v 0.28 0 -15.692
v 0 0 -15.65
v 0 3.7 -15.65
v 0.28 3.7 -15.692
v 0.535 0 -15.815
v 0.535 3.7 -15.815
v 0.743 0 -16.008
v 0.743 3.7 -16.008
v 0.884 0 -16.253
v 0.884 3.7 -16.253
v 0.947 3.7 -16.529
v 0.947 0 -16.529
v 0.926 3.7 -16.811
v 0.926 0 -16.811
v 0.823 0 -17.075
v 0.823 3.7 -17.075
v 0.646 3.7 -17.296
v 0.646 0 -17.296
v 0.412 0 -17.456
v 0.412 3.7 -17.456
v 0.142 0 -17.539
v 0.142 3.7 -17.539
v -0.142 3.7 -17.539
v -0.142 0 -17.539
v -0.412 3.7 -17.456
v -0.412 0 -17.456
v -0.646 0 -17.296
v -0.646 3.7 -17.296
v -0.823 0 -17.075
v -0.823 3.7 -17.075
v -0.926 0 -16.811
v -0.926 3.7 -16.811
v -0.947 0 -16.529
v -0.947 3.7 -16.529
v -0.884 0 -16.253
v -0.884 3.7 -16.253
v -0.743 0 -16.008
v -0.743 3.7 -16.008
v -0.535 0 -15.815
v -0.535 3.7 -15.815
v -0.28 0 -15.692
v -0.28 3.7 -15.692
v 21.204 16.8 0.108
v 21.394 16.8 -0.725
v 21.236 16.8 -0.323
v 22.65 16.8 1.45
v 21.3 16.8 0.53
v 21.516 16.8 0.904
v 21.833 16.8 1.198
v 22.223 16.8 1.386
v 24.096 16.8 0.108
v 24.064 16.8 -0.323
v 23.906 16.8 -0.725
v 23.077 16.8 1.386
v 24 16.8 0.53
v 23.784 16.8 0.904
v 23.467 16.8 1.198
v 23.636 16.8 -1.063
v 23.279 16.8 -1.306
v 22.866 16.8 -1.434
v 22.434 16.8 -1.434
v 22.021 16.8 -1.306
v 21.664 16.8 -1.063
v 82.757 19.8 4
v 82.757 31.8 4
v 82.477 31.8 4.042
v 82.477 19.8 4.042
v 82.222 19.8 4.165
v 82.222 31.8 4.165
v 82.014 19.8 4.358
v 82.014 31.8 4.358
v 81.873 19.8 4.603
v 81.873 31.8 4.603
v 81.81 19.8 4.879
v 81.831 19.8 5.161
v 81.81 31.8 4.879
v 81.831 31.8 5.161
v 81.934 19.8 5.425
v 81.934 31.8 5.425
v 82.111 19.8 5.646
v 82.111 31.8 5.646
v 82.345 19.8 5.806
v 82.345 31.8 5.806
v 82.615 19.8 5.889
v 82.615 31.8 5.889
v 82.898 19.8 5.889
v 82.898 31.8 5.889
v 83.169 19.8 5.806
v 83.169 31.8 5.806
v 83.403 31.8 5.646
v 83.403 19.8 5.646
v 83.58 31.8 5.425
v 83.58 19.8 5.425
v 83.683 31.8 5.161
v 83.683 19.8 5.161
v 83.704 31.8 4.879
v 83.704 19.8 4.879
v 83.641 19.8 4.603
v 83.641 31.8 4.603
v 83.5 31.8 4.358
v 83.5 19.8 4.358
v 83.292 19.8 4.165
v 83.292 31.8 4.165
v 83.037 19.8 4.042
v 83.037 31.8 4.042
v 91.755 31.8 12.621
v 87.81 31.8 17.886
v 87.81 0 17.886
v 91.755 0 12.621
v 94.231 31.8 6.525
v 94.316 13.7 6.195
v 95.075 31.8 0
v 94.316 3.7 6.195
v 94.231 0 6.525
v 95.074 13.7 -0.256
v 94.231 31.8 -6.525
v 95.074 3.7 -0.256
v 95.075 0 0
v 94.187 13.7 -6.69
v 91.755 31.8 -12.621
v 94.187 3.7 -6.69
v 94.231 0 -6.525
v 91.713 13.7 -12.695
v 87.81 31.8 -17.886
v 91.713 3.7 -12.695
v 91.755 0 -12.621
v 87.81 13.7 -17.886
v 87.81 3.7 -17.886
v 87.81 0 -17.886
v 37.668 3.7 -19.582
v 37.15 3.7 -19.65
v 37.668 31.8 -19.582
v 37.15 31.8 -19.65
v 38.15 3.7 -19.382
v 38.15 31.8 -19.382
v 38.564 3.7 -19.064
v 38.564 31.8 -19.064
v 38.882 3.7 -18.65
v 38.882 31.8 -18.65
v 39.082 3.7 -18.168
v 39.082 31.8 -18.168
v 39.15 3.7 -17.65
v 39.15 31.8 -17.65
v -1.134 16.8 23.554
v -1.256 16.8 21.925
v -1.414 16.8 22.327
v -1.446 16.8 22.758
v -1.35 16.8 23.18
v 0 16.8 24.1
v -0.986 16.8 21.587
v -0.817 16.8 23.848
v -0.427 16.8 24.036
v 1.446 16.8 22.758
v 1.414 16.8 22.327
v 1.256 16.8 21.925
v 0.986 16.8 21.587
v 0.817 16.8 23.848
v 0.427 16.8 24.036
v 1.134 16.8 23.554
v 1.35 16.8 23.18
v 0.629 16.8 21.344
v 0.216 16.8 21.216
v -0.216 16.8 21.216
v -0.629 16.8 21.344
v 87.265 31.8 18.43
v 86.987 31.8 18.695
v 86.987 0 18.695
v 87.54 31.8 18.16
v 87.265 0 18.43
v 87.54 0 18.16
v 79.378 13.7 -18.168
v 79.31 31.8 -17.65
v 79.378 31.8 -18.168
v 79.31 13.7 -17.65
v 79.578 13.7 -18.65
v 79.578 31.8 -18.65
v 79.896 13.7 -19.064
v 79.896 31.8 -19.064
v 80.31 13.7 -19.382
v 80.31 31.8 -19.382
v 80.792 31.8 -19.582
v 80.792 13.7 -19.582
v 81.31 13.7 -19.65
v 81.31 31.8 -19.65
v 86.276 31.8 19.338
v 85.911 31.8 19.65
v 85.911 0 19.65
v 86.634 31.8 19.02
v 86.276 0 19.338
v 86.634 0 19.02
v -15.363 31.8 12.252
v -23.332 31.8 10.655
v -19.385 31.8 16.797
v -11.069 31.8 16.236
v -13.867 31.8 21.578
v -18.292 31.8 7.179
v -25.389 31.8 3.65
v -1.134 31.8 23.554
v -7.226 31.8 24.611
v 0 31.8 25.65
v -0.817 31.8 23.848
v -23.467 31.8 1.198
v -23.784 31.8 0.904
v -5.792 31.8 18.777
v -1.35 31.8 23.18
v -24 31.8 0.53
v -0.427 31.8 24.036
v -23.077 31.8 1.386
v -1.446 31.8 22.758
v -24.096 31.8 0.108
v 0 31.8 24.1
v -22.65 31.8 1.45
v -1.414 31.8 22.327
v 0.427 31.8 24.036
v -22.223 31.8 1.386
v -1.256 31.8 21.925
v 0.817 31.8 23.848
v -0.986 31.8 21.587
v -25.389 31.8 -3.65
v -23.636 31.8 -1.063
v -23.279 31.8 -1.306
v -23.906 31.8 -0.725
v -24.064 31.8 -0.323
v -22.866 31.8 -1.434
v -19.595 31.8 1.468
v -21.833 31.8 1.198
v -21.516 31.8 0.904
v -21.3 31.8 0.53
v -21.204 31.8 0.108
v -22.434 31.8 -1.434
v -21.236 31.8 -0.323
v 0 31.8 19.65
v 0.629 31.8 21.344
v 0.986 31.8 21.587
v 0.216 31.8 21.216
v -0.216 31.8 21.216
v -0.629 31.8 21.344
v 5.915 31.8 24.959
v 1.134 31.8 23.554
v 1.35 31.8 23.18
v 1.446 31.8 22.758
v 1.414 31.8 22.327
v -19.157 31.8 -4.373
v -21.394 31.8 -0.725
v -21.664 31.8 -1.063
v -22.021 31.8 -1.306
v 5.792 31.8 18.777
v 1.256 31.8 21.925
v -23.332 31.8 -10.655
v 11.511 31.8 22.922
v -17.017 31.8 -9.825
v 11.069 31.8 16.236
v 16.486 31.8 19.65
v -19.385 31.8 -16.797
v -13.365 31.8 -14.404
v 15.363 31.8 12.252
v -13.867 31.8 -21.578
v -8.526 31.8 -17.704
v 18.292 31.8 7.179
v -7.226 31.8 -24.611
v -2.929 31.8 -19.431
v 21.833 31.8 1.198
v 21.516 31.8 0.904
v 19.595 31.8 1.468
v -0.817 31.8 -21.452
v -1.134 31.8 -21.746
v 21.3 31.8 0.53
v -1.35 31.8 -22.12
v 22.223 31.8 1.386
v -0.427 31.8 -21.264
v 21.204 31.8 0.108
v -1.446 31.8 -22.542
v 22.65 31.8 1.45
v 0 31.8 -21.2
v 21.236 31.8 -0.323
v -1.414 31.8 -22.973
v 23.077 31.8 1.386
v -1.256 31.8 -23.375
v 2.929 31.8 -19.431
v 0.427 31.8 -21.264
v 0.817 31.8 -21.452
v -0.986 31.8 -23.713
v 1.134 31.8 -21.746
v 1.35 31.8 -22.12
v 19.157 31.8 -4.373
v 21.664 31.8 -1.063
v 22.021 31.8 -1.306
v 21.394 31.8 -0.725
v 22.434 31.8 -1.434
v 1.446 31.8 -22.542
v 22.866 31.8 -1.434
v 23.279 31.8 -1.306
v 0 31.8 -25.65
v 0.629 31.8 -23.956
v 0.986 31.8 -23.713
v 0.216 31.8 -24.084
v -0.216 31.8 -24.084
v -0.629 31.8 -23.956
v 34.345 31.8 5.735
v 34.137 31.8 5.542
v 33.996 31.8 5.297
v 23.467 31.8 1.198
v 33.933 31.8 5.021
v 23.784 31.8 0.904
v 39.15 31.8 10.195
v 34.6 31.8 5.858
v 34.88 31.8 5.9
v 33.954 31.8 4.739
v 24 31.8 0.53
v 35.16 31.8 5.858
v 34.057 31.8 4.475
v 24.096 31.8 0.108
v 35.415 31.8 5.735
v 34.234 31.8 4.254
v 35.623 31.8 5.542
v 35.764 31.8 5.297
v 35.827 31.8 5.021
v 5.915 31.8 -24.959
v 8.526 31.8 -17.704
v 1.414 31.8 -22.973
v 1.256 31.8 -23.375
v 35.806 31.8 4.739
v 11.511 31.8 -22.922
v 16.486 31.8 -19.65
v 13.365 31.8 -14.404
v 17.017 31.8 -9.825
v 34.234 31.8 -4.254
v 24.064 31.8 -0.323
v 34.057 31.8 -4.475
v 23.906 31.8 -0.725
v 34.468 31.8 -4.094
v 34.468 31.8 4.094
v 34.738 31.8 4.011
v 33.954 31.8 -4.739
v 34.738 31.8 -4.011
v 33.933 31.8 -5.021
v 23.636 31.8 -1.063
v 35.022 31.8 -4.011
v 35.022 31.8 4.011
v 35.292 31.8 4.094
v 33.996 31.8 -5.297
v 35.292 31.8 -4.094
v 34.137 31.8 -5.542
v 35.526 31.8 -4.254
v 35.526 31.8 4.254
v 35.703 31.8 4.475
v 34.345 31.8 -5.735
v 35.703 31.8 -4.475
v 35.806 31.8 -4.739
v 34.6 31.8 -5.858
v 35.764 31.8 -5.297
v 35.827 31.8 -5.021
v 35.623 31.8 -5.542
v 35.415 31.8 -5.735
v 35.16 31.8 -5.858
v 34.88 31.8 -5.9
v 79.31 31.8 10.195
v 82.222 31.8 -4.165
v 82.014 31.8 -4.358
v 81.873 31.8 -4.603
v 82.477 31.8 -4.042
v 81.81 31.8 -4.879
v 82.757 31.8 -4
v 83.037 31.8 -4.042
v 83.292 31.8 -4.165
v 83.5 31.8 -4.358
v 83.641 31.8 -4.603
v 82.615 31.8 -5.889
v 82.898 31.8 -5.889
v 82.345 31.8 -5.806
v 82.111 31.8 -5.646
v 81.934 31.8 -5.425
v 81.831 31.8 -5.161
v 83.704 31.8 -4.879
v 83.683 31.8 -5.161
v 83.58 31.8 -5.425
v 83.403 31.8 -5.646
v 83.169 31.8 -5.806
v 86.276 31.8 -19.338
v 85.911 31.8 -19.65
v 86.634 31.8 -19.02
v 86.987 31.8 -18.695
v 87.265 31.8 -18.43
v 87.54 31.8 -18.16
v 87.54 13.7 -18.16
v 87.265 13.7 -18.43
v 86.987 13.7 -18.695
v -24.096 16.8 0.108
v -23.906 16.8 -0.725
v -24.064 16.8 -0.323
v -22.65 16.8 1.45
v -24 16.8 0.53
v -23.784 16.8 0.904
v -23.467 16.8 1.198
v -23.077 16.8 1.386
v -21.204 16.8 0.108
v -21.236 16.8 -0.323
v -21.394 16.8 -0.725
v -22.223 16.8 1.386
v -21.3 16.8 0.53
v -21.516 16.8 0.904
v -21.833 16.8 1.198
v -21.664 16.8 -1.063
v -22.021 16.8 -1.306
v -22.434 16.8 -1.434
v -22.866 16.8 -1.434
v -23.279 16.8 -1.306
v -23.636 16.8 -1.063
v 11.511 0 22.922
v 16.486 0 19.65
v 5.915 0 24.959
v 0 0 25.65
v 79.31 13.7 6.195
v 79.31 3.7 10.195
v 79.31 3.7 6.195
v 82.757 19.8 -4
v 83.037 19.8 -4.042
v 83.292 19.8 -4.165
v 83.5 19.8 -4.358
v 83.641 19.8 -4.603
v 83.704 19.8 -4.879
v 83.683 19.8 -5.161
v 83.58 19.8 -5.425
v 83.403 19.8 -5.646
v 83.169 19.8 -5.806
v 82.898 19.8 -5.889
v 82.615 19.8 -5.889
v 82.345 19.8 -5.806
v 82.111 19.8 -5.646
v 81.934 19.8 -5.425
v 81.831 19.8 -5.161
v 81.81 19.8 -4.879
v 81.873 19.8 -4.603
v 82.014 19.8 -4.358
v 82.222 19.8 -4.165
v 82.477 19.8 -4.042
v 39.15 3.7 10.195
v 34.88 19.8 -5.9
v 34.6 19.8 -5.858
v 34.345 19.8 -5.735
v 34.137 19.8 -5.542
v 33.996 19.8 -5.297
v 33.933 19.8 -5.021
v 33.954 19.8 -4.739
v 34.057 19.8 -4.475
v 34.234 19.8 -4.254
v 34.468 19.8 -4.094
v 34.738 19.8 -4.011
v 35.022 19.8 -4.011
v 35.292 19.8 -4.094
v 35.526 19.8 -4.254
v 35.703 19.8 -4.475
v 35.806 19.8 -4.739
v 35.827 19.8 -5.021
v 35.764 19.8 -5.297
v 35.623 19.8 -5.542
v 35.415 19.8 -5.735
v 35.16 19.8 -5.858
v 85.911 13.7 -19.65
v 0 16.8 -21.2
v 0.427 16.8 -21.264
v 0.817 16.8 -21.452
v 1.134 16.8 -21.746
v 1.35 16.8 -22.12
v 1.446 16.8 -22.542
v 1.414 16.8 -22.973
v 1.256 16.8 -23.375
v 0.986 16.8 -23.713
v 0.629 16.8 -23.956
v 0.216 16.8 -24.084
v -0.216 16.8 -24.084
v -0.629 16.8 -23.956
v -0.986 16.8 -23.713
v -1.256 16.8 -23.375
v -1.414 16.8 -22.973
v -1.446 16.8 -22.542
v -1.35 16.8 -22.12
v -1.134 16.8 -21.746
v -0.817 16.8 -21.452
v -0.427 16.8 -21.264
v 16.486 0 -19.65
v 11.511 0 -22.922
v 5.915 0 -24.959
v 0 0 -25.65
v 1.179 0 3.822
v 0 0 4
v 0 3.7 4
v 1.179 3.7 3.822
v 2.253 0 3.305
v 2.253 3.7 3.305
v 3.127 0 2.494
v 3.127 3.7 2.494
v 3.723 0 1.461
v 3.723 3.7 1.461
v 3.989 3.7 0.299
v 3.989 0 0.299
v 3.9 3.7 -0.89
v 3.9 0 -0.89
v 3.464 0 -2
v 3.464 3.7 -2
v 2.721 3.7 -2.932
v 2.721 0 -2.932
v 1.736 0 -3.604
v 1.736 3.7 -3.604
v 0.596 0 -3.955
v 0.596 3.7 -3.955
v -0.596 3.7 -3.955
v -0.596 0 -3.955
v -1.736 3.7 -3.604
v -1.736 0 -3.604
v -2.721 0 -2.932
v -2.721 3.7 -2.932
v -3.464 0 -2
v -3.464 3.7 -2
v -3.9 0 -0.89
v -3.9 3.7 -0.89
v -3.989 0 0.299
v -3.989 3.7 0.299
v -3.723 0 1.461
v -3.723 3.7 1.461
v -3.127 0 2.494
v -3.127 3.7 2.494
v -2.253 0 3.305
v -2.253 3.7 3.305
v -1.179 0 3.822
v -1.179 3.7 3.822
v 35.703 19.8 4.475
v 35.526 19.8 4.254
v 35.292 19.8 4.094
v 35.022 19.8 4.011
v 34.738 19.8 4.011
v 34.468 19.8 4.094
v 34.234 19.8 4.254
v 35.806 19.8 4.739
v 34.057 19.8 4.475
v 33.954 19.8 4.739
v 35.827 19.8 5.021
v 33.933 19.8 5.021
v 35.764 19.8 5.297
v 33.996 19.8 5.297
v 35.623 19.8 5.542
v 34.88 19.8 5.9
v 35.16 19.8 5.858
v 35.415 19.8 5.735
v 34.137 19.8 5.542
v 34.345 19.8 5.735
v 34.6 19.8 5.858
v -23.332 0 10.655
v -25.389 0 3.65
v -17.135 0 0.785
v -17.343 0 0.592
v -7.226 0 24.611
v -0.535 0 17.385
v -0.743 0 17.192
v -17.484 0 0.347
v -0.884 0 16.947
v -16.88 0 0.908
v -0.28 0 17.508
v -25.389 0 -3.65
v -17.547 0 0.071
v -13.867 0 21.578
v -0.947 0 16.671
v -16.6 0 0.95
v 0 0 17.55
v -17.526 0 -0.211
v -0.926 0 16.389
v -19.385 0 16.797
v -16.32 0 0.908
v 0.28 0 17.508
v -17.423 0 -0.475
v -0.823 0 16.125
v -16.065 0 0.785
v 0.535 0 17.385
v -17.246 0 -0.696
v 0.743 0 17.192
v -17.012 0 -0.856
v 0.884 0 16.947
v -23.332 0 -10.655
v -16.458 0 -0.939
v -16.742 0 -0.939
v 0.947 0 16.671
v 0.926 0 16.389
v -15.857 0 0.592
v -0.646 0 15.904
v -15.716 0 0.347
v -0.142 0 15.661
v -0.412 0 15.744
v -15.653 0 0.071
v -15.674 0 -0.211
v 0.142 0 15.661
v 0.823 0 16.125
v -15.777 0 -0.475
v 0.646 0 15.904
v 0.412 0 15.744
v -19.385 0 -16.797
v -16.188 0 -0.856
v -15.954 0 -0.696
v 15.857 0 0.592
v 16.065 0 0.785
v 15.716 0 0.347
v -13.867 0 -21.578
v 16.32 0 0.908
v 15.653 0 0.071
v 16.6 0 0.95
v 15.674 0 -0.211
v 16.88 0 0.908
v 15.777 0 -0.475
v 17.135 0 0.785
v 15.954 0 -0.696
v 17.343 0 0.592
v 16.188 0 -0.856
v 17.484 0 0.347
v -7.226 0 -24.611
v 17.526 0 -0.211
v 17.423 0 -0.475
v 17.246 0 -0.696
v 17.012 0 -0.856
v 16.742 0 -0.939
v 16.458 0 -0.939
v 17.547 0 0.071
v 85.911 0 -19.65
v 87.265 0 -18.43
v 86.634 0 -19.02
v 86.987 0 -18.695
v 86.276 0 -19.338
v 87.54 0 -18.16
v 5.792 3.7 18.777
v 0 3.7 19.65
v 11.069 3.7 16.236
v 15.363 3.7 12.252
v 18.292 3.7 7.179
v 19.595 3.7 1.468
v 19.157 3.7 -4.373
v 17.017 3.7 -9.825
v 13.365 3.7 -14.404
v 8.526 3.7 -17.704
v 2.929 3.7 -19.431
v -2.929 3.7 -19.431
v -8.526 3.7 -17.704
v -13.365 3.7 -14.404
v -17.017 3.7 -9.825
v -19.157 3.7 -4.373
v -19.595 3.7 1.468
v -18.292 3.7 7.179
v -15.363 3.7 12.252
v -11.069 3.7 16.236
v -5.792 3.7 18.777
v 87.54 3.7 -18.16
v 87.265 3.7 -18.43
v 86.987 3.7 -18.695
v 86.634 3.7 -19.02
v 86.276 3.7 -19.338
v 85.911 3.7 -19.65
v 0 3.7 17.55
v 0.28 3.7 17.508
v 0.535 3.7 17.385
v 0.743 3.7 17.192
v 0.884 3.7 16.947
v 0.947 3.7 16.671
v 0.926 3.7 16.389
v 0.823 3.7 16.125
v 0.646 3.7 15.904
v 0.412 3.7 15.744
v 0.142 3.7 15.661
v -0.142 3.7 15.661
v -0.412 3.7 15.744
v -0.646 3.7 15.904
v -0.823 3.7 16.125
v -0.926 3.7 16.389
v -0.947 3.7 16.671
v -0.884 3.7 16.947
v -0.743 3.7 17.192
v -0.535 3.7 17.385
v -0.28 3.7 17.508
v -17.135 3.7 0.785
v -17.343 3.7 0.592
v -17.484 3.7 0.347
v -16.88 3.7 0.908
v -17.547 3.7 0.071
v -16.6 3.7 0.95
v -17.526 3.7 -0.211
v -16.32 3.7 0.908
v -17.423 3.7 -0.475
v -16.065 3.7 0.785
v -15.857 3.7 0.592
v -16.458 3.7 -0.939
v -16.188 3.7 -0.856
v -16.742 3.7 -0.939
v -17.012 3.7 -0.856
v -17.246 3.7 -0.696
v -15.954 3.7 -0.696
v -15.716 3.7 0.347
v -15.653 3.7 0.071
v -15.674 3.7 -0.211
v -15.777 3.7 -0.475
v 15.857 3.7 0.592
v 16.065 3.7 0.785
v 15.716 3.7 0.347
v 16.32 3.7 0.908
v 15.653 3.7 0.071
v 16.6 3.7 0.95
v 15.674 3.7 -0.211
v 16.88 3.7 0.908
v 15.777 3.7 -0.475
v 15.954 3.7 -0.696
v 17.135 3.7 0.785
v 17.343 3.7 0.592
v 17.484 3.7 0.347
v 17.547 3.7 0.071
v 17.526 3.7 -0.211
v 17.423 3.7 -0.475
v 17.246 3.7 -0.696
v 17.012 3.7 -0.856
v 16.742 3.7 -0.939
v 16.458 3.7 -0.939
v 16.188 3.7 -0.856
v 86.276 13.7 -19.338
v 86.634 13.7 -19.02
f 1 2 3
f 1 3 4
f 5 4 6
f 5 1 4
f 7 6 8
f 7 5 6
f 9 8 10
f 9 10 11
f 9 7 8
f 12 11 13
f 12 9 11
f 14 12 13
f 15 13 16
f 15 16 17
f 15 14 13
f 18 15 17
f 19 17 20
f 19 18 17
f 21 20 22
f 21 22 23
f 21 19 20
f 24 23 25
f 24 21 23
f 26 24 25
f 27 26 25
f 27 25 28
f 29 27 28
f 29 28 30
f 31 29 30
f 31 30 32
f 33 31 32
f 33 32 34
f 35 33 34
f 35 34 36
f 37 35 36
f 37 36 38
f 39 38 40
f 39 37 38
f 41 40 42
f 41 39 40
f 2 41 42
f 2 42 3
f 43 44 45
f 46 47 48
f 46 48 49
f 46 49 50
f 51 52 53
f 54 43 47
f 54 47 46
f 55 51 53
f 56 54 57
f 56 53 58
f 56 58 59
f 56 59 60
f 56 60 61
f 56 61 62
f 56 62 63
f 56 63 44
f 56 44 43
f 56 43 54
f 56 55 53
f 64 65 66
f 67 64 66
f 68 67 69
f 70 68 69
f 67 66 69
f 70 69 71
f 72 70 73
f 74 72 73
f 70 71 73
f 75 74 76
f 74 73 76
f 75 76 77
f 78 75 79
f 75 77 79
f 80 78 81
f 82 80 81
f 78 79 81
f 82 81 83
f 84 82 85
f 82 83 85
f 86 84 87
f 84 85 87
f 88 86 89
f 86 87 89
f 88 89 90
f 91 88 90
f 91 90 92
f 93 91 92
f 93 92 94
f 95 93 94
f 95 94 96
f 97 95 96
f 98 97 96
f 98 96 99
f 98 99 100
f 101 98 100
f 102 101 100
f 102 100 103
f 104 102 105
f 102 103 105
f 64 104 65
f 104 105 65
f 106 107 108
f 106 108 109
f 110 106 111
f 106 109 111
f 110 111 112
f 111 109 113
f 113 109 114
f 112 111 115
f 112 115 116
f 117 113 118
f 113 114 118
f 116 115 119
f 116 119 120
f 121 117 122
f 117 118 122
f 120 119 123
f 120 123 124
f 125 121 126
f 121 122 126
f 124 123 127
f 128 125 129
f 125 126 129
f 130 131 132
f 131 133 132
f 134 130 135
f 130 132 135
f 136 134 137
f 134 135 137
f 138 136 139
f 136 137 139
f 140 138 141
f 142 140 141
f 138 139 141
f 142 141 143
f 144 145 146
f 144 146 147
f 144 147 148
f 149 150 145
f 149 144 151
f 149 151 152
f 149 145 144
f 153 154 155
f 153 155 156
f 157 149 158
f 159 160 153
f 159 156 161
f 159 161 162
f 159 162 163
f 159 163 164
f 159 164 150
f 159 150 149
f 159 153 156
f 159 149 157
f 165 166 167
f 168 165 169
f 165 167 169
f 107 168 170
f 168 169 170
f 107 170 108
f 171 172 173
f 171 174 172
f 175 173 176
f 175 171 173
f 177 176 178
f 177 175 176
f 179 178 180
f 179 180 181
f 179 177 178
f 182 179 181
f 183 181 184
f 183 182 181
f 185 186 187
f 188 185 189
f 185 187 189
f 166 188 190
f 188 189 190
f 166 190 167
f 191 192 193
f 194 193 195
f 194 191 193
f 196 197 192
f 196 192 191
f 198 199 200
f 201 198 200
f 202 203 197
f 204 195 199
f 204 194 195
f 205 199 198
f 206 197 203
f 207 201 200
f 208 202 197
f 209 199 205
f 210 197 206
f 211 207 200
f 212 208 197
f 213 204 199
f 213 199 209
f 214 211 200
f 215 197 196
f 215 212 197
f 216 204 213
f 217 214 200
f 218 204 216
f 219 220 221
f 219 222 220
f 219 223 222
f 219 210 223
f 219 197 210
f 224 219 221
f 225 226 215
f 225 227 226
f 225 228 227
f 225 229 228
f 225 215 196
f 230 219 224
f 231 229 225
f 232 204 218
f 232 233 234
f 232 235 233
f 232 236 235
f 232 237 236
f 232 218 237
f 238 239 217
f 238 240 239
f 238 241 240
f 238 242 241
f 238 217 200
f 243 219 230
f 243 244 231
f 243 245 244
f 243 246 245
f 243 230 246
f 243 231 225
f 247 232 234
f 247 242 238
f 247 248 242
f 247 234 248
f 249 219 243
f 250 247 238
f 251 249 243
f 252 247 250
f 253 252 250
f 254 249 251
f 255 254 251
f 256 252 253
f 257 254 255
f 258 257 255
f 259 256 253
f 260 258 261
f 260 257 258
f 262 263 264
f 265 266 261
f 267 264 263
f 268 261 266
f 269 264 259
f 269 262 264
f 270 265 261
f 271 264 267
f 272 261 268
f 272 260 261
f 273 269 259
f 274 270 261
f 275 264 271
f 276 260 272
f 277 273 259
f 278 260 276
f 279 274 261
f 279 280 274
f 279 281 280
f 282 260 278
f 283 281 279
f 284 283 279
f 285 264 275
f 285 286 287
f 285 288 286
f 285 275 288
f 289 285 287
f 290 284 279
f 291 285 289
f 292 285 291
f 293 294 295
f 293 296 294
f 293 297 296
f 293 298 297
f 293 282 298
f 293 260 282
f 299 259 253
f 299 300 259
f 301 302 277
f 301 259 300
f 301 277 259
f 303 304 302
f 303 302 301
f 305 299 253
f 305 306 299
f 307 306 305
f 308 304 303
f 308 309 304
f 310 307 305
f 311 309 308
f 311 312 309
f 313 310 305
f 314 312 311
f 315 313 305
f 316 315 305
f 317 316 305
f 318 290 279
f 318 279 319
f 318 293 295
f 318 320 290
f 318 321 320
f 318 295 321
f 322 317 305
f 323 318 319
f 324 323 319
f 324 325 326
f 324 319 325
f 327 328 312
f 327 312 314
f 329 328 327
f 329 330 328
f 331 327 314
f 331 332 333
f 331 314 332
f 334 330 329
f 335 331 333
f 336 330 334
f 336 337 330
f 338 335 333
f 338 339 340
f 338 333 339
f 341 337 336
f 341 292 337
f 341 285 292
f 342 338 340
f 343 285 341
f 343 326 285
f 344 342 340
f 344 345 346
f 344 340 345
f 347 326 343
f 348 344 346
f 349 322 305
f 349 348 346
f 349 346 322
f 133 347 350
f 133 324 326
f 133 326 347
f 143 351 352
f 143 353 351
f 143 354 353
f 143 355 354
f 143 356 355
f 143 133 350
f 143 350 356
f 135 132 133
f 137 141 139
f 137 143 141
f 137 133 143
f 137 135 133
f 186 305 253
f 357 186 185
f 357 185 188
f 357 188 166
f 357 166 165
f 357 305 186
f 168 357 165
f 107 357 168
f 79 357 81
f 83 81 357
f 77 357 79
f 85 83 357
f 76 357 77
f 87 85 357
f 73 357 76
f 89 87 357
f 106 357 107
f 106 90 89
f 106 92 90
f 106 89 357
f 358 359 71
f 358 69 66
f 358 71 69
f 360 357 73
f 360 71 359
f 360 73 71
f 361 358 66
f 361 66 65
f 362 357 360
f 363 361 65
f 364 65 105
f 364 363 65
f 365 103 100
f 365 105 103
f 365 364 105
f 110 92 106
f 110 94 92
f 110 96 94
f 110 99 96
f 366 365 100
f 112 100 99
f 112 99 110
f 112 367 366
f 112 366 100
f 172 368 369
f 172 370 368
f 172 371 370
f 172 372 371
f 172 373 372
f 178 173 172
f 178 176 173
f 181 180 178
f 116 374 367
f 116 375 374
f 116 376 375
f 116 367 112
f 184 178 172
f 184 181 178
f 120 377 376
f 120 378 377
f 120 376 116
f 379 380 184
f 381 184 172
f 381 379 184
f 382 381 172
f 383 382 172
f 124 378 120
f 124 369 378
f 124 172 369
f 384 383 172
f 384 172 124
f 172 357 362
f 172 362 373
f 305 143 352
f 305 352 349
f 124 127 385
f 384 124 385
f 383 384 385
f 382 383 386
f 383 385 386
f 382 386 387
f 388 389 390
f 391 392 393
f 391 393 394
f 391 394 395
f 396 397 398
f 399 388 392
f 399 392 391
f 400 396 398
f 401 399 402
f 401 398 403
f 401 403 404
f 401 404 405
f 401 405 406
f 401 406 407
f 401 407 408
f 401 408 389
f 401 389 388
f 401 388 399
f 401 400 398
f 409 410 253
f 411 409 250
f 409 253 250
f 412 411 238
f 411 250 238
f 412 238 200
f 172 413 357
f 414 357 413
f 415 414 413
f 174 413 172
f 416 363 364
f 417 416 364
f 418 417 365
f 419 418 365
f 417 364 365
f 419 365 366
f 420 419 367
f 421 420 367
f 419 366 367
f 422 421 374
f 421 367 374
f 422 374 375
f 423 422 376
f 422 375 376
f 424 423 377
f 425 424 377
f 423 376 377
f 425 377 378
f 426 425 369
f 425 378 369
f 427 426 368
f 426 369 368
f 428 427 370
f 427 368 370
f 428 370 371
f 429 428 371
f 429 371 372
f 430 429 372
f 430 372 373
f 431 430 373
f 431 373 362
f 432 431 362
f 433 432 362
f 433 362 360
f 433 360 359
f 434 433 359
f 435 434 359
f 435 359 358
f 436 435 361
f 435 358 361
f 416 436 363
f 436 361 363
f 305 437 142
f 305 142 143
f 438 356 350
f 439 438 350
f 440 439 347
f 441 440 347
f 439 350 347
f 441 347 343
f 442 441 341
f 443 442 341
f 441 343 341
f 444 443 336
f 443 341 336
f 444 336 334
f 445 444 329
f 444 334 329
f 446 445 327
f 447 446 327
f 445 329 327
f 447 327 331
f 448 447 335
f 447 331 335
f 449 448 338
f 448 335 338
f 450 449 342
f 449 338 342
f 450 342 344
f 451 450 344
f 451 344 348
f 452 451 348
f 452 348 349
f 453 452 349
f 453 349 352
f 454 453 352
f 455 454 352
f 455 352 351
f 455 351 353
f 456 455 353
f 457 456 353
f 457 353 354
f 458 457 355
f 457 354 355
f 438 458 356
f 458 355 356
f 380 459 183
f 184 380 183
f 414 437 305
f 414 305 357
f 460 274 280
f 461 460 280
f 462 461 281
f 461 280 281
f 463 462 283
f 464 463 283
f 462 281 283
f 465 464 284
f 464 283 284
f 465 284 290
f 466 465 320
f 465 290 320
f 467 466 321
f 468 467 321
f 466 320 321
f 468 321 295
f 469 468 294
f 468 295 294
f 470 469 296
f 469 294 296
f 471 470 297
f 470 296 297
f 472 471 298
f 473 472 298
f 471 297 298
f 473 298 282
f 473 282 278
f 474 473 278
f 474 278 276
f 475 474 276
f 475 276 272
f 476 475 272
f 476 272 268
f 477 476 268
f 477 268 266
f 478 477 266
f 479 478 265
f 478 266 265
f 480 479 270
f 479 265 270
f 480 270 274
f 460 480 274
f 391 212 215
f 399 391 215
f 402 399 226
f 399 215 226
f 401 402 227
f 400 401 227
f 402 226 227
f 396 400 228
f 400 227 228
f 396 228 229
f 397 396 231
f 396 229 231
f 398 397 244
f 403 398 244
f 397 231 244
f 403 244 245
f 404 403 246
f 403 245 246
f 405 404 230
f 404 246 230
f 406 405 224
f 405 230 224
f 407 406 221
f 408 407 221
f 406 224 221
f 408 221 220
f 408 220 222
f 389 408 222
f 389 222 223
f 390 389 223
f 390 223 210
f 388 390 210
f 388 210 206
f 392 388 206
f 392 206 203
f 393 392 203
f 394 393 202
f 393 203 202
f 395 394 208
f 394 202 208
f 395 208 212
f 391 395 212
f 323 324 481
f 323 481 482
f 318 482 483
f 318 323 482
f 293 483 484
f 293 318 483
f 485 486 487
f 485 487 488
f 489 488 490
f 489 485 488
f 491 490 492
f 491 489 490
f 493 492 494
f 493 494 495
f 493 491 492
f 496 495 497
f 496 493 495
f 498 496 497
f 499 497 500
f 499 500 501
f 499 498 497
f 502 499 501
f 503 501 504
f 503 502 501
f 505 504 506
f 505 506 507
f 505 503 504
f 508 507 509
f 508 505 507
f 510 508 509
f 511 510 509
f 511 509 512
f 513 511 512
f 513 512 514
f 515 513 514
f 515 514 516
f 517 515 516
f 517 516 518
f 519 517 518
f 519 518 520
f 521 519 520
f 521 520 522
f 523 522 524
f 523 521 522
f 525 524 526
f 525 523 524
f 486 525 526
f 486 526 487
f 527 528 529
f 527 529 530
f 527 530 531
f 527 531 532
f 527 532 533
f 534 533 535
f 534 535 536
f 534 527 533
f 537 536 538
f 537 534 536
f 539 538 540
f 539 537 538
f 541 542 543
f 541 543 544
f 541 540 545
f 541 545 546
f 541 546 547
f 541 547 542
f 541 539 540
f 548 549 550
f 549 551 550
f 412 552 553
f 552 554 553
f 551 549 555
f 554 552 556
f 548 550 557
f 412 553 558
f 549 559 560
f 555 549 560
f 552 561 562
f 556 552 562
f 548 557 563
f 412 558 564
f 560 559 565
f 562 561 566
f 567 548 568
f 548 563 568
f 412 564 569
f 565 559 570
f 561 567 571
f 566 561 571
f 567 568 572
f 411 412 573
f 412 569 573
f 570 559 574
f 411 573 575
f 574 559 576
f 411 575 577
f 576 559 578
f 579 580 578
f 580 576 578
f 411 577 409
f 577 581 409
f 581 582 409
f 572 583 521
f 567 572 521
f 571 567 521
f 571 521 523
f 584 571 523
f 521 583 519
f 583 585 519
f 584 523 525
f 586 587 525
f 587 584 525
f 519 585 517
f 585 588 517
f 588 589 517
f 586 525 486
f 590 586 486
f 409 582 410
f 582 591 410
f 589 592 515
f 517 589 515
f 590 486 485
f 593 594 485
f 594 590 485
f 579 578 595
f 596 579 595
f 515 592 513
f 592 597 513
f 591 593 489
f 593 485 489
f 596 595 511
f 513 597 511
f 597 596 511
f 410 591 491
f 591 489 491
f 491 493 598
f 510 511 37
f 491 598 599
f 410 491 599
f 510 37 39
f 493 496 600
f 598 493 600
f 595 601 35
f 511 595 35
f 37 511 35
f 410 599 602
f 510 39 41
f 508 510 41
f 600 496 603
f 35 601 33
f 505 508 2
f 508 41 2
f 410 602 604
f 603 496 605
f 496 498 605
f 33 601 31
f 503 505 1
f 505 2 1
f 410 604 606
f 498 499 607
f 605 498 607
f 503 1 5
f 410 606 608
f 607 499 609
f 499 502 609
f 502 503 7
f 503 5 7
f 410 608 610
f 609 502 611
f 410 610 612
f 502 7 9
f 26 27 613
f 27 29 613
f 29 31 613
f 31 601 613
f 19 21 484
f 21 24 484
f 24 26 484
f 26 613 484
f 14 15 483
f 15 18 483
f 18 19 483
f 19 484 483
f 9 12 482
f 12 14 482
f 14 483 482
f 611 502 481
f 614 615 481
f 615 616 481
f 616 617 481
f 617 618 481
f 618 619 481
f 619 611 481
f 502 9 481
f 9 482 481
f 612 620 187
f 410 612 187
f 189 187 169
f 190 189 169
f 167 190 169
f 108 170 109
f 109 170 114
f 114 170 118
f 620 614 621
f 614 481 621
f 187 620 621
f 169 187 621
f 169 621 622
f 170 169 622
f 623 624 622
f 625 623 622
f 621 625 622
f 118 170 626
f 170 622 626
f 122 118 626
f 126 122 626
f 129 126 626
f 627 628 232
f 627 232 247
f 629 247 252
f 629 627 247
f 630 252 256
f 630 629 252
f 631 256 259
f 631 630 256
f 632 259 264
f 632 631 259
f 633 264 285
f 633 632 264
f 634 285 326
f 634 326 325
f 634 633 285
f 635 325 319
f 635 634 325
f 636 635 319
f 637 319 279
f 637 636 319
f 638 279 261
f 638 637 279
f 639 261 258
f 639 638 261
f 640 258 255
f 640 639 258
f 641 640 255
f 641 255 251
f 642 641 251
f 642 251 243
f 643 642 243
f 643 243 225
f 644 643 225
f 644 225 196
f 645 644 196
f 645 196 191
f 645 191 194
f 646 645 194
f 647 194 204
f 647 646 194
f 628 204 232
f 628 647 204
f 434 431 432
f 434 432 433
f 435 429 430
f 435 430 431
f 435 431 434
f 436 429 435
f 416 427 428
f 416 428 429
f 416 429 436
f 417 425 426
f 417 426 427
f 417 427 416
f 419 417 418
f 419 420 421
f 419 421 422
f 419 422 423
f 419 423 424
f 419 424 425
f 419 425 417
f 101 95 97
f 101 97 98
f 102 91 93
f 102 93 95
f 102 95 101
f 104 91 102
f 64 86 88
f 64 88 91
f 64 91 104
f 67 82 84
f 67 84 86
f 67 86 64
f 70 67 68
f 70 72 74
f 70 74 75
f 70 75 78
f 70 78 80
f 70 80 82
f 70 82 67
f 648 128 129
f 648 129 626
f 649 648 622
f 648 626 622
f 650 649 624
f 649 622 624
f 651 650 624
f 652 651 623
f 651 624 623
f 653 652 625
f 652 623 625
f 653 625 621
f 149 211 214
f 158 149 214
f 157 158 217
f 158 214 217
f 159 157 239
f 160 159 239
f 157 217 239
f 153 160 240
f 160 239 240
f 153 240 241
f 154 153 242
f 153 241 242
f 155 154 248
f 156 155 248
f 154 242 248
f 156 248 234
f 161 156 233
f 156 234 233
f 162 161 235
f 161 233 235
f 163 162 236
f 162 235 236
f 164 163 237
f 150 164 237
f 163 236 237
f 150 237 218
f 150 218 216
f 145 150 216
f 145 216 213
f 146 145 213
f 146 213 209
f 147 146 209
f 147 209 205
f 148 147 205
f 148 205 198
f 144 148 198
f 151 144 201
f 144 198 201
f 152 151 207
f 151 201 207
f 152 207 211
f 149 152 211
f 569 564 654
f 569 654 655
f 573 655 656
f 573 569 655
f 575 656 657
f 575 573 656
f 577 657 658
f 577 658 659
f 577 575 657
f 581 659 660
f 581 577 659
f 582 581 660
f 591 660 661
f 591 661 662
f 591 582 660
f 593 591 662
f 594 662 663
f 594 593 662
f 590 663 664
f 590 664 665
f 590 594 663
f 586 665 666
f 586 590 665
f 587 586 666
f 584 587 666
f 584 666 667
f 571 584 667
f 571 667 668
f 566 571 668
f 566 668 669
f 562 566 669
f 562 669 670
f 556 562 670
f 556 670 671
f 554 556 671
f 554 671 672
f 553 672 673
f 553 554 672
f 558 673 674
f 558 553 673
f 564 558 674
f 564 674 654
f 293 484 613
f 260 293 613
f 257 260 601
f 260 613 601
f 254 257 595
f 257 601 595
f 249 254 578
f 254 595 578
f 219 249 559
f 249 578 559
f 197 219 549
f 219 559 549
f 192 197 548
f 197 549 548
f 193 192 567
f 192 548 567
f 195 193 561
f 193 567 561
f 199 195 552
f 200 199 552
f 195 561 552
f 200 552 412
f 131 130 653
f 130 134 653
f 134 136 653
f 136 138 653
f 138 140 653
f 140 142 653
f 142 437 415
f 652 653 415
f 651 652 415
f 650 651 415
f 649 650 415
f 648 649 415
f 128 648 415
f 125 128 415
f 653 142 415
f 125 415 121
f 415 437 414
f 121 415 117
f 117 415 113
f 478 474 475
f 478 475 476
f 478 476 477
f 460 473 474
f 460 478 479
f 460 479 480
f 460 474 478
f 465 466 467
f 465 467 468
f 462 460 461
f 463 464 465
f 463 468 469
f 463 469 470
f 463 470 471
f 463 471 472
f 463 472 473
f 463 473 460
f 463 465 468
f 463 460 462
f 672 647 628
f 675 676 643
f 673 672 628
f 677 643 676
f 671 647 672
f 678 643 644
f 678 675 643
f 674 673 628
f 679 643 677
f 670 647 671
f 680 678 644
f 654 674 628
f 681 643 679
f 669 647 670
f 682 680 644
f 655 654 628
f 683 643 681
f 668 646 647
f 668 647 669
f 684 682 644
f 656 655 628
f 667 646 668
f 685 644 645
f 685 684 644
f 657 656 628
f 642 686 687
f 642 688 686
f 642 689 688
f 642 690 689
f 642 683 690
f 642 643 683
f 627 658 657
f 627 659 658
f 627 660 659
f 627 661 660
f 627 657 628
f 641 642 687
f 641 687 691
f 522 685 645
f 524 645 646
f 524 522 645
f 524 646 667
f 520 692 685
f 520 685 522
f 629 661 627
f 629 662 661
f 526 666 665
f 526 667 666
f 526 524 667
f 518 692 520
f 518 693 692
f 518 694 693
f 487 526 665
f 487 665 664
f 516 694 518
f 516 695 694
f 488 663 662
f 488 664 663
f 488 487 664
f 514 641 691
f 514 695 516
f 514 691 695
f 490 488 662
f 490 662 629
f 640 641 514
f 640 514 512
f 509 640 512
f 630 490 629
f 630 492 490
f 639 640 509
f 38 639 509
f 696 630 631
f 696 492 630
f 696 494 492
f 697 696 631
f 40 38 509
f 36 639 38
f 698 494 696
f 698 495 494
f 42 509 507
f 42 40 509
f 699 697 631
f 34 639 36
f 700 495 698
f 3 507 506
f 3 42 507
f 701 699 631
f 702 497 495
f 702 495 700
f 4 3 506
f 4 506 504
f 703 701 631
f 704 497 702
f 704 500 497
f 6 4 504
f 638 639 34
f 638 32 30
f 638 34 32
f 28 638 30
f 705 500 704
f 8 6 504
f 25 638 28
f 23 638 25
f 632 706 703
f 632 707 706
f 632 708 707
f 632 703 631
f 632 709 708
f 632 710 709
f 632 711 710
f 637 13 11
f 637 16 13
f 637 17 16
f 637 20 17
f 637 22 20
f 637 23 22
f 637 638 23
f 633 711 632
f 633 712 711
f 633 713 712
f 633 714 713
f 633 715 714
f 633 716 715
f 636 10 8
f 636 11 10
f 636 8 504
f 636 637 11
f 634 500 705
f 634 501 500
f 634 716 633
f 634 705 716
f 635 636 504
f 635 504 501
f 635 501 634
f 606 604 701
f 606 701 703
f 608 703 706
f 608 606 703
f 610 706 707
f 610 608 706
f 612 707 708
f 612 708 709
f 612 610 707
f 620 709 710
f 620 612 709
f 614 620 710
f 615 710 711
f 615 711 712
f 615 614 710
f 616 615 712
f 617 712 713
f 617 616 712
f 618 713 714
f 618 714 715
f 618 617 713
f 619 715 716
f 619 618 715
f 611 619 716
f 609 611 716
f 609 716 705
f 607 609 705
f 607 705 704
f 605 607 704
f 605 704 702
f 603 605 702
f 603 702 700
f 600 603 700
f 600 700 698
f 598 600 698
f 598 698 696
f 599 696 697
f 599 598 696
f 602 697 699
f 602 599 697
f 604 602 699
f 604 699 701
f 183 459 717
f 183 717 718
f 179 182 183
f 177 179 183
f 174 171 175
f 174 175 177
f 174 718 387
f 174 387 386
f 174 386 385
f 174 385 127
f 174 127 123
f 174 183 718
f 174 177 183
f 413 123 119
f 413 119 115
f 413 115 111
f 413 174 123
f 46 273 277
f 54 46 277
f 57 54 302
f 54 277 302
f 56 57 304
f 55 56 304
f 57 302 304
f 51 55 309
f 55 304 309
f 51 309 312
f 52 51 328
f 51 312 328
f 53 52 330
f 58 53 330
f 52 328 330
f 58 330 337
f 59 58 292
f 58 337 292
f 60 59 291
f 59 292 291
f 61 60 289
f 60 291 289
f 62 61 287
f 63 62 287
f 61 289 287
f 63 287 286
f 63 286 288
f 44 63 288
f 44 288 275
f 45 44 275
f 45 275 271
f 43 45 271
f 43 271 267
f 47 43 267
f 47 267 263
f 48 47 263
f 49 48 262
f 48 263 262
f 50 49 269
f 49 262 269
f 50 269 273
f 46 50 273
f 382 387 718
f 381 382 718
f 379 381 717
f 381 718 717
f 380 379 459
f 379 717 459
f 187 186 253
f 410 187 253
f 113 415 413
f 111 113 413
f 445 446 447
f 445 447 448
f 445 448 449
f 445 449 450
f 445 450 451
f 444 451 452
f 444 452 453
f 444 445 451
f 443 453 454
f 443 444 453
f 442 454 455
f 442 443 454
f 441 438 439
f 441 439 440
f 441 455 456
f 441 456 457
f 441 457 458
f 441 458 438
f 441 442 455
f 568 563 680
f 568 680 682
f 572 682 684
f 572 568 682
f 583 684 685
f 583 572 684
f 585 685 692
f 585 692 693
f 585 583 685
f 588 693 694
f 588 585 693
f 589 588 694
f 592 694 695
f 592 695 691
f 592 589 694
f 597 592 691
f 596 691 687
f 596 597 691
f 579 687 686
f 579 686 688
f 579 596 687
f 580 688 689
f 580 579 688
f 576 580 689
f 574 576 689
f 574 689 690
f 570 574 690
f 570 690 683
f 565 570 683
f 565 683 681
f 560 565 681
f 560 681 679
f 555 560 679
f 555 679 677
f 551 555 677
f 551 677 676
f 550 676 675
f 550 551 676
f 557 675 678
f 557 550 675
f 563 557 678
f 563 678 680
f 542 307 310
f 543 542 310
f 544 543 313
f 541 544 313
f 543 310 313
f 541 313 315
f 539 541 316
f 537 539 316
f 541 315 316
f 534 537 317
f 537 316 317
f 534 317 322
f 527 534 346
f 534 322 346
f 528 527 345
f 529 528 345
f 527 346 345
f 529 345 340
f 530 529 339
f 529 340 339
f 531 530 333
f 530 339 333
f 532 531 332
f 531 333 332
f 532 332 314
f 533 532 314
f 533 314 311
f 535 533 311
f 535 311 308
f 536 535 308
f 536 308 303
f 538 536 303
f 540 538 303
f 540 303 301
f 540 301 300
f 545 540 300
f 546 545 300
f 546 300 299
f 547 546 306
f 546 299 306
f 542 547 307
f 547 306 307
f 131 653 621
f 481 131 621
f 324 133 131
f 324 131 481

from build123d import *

# Parameters (mm, degrees)
SKETCH1_R               = 25.65
SKETCH1_R_2             = 19.65
SKETCH1_R_3             = 4
SKETCH1_R_4             = 0.95
SKETCH1_W               = 40.16
SKETCH1_H               = 20.39
BOSS_EXTRUDE2_DEPTH     = 3.7
SKETCH5_R               = 19.65
SKETCH5_W               = 40.16
SKETCH5_H               = 20.39
BOSS_EXTRUDE3_DEPTH     = 28.1
CUT_EXTRUDE1_REACH      = 108.468
SKETCH6_W               = 40.16
SKETCH6_H               = 28.1
CUT_EXTRUDE2_REACH      = 114.631
CUT_EXTRUDE2_END_RADIUS = 25.65
SKETCH7_W               = 29.863740461
SKETCH7_H               = 10
SKETCH8_R               = 1.45
CUT_EXTRUDE3_DEPTH      = 15
SKETCH9_R               = 0.95
CUT_EXTRUDE4_DEPTH      = 12
CUT_EXTRUDE5_DEPTH      = 104.481486871
FILLET1_R               = 2


with BuildPart() as part:
    # Sketch1 → Boss-Extrude2 (new body)
    # profile 1 of 6: a face of its own
    with BuildSketch(Plane(origin=(0, 0, 0), x_dir=(1, 0, 0), z_dir=(0, 1, 0))):
        Circle(SKETCH1_R)
        Circle(SKETCH1_R_2, mode=Mode.SUBTRACT)
    # profile 2 of 6: a face of its own
    with BuildSketch(Plane(origin=(0, 0, 0), x_dir=(1, 0, 0), z_dir=(0, 1, 0))):
        Circle(SKETCH1_R_2)
        with Locations(Location((0, 0, 0), (0, 0, 270))):
            Circle(SKETCH1_R_3, mode=Mode.SUBTRACT)
        with Locations(Location((16.6, 0, 0), (0, 0, 270))):
            Circle(SKETCH1_R_4, mode=Mode.SUBTRACT)
        with Locations(Location((0, -16.6, 0), (0, 0, 270))):
            Circle(SKETCH1_R_4, mode=Mode.SUBTRACT)
        with Locations(Location((-16.6, 0, 0), (0, 0, 270))):
            Circle(SKETCH1_R_4, mode=Mode.SUBTRACT)
        with Locations(Location((0, 16.6, 0), (0, 0, 270))):
            Circle(SKETCH1_R_4, mode=Mode.SUBTRACT)
    # profile 3 of 6: a face of its own
    with BuildSketch(Plane(origin=(0, 0, 0), x_dir=(1, 0, 0), z_dir=(0, 1, 0))):
        with BuildLine():
            Line((30.65, 18.695), (86.986875612, 18.695))
            ThreePointArc((86.986875612, 18.695), (78.869462663, 23.847948025), (69.425, 25.65))
            Line((69.425, 25.65), (0, 25.65))
            ThreePointArc((0, 25.65), (18.137288937, 18.137288937), (25.65, 0))
            ThreePointArc((25.65, 0), (18.137288937, -18.137288937), (0, -25.65))
            Line((0, -25.65), (69.425, -25.65))
            ThreePointArc((69.425, -25.65), (78.869462663, -23.847948025), (86.986875612, -18.695))
            Line((86.986875612, -18.695), (30.65, -18.695))
            Line((30.65, -18.695), (30.65, 18.695))
        make_face()
    # profile 4 of 6: a face of its own
    with BuildSketch(Plane(origin=(0, 0, 0), x_dir=(1, 0, 0), z_dir=(0, 1, 0))):
        with BuildLine():
            Line((87.81, -17.886147573), (87.81, 17.886147573))
            ThreePointArc((87.81, 17.886147573), (87.402987293, 18.295203548), (86.986875612, 18.695))
            Line((86.986875612, 18.695), (30.65, 18.695))
            Line((30.65, 18.695), (30.65, -18.695))
            Line((30.65, -18.695), (86.986875612, -18.695))
            ThreePointArc((86.986875612, -18.695), (87.402987293, -18.295203548), (87.81, -17.886147573))
        make_face()
        with Locations((59.23, 0)):
            Rectangle(SKETCH1_W, SKETCH1_H, mode=Mode.SUBTRACT)
    # profile 5 of 6: a face of its own
    with BuildSketch(Plane(origin=(0, 0, 0), x_dir=(1, 0, 0), z_dir=(0, 1, 0))):
        with Locations((59.23, 0)):
            Rectangle(SKETCH1_W, SKETCH1_H)
    # profile 6 of 6: a face of its own
    with BuildSketch(Plane(origin=(0, 0, 0), x_dir=(1, 0, 0), z_dir=(0, 1, 0))):
        with BuildLine():
            ThreePointArc((87.81, -17.886147573), (95.075, 0), (87.81, 17.886147573))
            Line((87.81, 17.886147573), (87.81, -17.886147573))
        make_face()
    extrude(amount=BOSS_EXTRUDE2_DEPTH)

    # Sketch5 → Boss-Extrude3 (add)
    # profile 1 of 4: a face of its own
    with BuildSketch(Plane(origin=(0, 3.7, 0), x_dir=(1, 0, 0), z_dir=(0, 1, 0))):
        with BuildLine():
            ThreePointArc((25.65, 0), (18.137288937, 18.137288937), (0, 25.65))
            ThreePointArc((0, 25.65), (-25.65, 0), (0, -25.65))
            ThreePointArc((0, -25.65), (18.137288937, -18.137288937), (25.65, 0))
        make_face()
        with Locations(Location((0, 0, 0), (0, 0, 270))):
            Circle(SKETCH5_R, mode=Mode.SUBTRACT)
    # profile 2 of 4: a face of its own
    with BuildSketch(Plane(origin=(0, 3.7, 0), x_dir=(1, 0, 0), z_dir=(0, 1, 0))):
        with BuildLine():
            ThreePointArc((87.81, 17.886147573), (87.402987293, 18.295203548), (86.986875612, 18.695))
            Line((86.986875612, 18.695), (30.65, 18.695))
            Line((30.65, 18.695), (30.65, -18.695))
            Line((30.65, -18.695), (86.986875612, -18.695))
            ThreePointArc((86.986875612, -18.695), (87.402987293, -18.295203548), (87.81, -17.886147573))
            Line((87.81, -17.886147573), (87.81, 17.886147573))
        make_face()
        with Locations((59.23, 0)):
            Rectangle(SKETCH5_W, SKETCH5_H, mode=Mode.SUBTRACT)
    # profile 3 of 4: a face of its own
    with BuildSketch(Plane(origin=(0, 3.7, 0), x_dir=(1, 0, 0), z_dir=(0, 1, 0))):
        with BuildLine():
            ThreePointArc((86.986875612, 18.695), (78.869462663, 23.847948025), (69.425, 25.65))
            Line((69.425, 25.65), (0, 25.65))
            ThreePointArc((0, 25.65), (18.137288937, 18.137288937), (25.65, 0))
            ThreePointArc((25.65, 0), (18.137288937, -18.137288937), (0, -25.65))
            Line((0, -25.65), (69.425, -25.65))
            ThreePointArc((69.425, -25.65), (78.869462663, -23.847948025), (86.986875612, -18.695))
            Line((86.986875612, -18.695), (30.65, -18.695))
            Line((30.65, -18.695), (30.65, 18.695))
            Line((30.65, 18.695), (86.986875612, 18.695))
        make_face()
    # profile 4 of 4: a face of its own
    with BuildSketch(Plane(origin=(0, 3.7, 0), x_dir=(1, 0, 0), z_dir=(0, 1, 0))):
        with BuildLine():
            ThreePointArc((87.81, -17.886147573), (95.075, 0), (87.81, 17.886147573))
            Line((87.81, 17.886147573), (87.81, -17.886147573))
        make_face()
    extrude(amount=BOSS_EXTRUDE3_DEPTH)

    # Sketch6 → Cut-Extrude1 (cut, up to next)
    with BuildSketch(Plane.XY.offset(-10.195), mode=Mode.PRIVATE) as cut_extrude1_sk1:
        with Locations((59.23, 17.75)):
            Rectangle(SKETCH6_W, SKETCH6_H)
    cut_extrude1_tool1 = extrude(cut_extrude1_sk1.sketch, amount=-CUT_EXTRUDE1_REACH, mode=Mode.PRIVATE) & part.part
    add(cut_extrude1_tool1.solids().sort_by_distance((59.23, 17.75, -10.195))[0], mode=Mode.SUBTRACT)

    # Cut-Extrude2: up to this cylinder (the profile starts inside it)
    cut_extrude2_end = Plane(origin=(69.425, 8.7, 0), z_dir=(0, -1, 0)) * Cylinder(CUT_EXTRUDE2_END_RADIUS, 281.562, mode=Mode.PRIVATE)
    # Sketch7 → Cut-Extrude2 (cut, up to the surface)
    with BuildSketch(Plane.ZY.offset(-79.31), mode=Mode.PRIVATE) as cut_extrude2_sk1:
        with Locations((-8.736870231, 8.7)):
            Rectangle(SKETCH7_W, SKETCH7_H)
    cut_extrude2_tool1 = extrude(cut_extrude2_sk1.sketch, amount=-CUT_EXTRUDE2_REACH, mode=Mode.PRIVATE) & cut_extrude2_end
    add(cut_extrude2_tool1.solids().sort_by_distance((79.31, 8.7, -8.73687))[0], mode=Mode.SUBTRACT)

    # Sketch8 → Cut-Extrude3 (cut)
    with BuildSketch(Plane(origin=(0, 31.8, 0), x_dir=(1, 0, 0), z_dir=(0, 1, 0))):
        with Locations(Location((22.65, 0, 0), (0, 0, 270))):
            Circle(SKETCH8_R)
        with Locations(Location((0, -22.65, 0), (0, 0, 270))):
            Circle(SKETCH8_R)
        with Locations(Location((-22.65, 0, 0), (0, 0, 270))):
            Circle(SKETCH8_R)
        with Locations(Location((0, 22.65, 0), (0, 0, 270))):
            Circle(SKETCH8_R)
    extrude(amount=-CUT_EXTRUDE3_DEPTH, mode=Mode.SUBTRACT)

    # Sketch9 → Cut-Extrude4 (cut)
    with BuildSketch(Plane(origin=(0, 31.8, 0), x_dir=(1, 0, 0), z_dir=(0, 1, 0))):
        with Locations(Location((34.88, -4.95, 0), (0, 0, 270))):
            Circle(SKETCH9_R)
        with Locations(Location((34.88, 4.95, 0), (0, 0, 90))):
            Circle(SKETCH9_R)
        with Locations(Location((82.756875612, -4.95, 0), (0, 0, 90))):
            Circle(SKETCH9_R)
        with Locations(Location((82.756875612, 4.95, 0), (0, 0, 270))):
            Circle(SKETCH9_R)
    extrude(amount=-CUT_EXTRUDE4_DEPTH, mode=Mode.SUBTRACT)

    # Sketch12 → Cut-Extrude5 (cut, through all)
    with BuildSketch(Plane(origin=(0, 31.8, 0), x_dir=(1, 0, 0), z_dir=(0, 1, 0))):
        with BuildLine():
            Line((0, 25.65), (69.425, 25.65))
            ThreePointArc((69.425, 25.65), (78.19711491, 24.103371134), (85.911357997, 19.65))
            Line((85.911357997, 19.65), (16.486357997, 19.65))
            ThreePointArc((16.486357997, 19.65), (8.77211491, 24.103371134), (0, 25.65))
        make_face()
        with BuildLine():
            Line((0, -25.65), (69.425, -25.65))
            ThreePointArc((69.425, -25.65), (78.19711491, -24.103371134), (85.911357997, -19.65))
            Line((85.911357997, -19.65), (16.486357997, -19.65))
            ThreePointArc((16.486357997, -19.65), (8.77211491, -24.103371134), (0, -25.65))
        make_face()
    extrude(amount=-CUT_EXTRUDE5_DEPTH, mode=Mode.SUBTRACT)

    # Fillet1
    fillet1_edges = [part.edges().sort_by_distance(p)[0] for p in [
        (39.15, 17.75, -19.65),
        (79.31, 22.75, -19.65),
    ]]
    fillet(fillet1_edges, radius=FILLET1_R)


solid = part.part
